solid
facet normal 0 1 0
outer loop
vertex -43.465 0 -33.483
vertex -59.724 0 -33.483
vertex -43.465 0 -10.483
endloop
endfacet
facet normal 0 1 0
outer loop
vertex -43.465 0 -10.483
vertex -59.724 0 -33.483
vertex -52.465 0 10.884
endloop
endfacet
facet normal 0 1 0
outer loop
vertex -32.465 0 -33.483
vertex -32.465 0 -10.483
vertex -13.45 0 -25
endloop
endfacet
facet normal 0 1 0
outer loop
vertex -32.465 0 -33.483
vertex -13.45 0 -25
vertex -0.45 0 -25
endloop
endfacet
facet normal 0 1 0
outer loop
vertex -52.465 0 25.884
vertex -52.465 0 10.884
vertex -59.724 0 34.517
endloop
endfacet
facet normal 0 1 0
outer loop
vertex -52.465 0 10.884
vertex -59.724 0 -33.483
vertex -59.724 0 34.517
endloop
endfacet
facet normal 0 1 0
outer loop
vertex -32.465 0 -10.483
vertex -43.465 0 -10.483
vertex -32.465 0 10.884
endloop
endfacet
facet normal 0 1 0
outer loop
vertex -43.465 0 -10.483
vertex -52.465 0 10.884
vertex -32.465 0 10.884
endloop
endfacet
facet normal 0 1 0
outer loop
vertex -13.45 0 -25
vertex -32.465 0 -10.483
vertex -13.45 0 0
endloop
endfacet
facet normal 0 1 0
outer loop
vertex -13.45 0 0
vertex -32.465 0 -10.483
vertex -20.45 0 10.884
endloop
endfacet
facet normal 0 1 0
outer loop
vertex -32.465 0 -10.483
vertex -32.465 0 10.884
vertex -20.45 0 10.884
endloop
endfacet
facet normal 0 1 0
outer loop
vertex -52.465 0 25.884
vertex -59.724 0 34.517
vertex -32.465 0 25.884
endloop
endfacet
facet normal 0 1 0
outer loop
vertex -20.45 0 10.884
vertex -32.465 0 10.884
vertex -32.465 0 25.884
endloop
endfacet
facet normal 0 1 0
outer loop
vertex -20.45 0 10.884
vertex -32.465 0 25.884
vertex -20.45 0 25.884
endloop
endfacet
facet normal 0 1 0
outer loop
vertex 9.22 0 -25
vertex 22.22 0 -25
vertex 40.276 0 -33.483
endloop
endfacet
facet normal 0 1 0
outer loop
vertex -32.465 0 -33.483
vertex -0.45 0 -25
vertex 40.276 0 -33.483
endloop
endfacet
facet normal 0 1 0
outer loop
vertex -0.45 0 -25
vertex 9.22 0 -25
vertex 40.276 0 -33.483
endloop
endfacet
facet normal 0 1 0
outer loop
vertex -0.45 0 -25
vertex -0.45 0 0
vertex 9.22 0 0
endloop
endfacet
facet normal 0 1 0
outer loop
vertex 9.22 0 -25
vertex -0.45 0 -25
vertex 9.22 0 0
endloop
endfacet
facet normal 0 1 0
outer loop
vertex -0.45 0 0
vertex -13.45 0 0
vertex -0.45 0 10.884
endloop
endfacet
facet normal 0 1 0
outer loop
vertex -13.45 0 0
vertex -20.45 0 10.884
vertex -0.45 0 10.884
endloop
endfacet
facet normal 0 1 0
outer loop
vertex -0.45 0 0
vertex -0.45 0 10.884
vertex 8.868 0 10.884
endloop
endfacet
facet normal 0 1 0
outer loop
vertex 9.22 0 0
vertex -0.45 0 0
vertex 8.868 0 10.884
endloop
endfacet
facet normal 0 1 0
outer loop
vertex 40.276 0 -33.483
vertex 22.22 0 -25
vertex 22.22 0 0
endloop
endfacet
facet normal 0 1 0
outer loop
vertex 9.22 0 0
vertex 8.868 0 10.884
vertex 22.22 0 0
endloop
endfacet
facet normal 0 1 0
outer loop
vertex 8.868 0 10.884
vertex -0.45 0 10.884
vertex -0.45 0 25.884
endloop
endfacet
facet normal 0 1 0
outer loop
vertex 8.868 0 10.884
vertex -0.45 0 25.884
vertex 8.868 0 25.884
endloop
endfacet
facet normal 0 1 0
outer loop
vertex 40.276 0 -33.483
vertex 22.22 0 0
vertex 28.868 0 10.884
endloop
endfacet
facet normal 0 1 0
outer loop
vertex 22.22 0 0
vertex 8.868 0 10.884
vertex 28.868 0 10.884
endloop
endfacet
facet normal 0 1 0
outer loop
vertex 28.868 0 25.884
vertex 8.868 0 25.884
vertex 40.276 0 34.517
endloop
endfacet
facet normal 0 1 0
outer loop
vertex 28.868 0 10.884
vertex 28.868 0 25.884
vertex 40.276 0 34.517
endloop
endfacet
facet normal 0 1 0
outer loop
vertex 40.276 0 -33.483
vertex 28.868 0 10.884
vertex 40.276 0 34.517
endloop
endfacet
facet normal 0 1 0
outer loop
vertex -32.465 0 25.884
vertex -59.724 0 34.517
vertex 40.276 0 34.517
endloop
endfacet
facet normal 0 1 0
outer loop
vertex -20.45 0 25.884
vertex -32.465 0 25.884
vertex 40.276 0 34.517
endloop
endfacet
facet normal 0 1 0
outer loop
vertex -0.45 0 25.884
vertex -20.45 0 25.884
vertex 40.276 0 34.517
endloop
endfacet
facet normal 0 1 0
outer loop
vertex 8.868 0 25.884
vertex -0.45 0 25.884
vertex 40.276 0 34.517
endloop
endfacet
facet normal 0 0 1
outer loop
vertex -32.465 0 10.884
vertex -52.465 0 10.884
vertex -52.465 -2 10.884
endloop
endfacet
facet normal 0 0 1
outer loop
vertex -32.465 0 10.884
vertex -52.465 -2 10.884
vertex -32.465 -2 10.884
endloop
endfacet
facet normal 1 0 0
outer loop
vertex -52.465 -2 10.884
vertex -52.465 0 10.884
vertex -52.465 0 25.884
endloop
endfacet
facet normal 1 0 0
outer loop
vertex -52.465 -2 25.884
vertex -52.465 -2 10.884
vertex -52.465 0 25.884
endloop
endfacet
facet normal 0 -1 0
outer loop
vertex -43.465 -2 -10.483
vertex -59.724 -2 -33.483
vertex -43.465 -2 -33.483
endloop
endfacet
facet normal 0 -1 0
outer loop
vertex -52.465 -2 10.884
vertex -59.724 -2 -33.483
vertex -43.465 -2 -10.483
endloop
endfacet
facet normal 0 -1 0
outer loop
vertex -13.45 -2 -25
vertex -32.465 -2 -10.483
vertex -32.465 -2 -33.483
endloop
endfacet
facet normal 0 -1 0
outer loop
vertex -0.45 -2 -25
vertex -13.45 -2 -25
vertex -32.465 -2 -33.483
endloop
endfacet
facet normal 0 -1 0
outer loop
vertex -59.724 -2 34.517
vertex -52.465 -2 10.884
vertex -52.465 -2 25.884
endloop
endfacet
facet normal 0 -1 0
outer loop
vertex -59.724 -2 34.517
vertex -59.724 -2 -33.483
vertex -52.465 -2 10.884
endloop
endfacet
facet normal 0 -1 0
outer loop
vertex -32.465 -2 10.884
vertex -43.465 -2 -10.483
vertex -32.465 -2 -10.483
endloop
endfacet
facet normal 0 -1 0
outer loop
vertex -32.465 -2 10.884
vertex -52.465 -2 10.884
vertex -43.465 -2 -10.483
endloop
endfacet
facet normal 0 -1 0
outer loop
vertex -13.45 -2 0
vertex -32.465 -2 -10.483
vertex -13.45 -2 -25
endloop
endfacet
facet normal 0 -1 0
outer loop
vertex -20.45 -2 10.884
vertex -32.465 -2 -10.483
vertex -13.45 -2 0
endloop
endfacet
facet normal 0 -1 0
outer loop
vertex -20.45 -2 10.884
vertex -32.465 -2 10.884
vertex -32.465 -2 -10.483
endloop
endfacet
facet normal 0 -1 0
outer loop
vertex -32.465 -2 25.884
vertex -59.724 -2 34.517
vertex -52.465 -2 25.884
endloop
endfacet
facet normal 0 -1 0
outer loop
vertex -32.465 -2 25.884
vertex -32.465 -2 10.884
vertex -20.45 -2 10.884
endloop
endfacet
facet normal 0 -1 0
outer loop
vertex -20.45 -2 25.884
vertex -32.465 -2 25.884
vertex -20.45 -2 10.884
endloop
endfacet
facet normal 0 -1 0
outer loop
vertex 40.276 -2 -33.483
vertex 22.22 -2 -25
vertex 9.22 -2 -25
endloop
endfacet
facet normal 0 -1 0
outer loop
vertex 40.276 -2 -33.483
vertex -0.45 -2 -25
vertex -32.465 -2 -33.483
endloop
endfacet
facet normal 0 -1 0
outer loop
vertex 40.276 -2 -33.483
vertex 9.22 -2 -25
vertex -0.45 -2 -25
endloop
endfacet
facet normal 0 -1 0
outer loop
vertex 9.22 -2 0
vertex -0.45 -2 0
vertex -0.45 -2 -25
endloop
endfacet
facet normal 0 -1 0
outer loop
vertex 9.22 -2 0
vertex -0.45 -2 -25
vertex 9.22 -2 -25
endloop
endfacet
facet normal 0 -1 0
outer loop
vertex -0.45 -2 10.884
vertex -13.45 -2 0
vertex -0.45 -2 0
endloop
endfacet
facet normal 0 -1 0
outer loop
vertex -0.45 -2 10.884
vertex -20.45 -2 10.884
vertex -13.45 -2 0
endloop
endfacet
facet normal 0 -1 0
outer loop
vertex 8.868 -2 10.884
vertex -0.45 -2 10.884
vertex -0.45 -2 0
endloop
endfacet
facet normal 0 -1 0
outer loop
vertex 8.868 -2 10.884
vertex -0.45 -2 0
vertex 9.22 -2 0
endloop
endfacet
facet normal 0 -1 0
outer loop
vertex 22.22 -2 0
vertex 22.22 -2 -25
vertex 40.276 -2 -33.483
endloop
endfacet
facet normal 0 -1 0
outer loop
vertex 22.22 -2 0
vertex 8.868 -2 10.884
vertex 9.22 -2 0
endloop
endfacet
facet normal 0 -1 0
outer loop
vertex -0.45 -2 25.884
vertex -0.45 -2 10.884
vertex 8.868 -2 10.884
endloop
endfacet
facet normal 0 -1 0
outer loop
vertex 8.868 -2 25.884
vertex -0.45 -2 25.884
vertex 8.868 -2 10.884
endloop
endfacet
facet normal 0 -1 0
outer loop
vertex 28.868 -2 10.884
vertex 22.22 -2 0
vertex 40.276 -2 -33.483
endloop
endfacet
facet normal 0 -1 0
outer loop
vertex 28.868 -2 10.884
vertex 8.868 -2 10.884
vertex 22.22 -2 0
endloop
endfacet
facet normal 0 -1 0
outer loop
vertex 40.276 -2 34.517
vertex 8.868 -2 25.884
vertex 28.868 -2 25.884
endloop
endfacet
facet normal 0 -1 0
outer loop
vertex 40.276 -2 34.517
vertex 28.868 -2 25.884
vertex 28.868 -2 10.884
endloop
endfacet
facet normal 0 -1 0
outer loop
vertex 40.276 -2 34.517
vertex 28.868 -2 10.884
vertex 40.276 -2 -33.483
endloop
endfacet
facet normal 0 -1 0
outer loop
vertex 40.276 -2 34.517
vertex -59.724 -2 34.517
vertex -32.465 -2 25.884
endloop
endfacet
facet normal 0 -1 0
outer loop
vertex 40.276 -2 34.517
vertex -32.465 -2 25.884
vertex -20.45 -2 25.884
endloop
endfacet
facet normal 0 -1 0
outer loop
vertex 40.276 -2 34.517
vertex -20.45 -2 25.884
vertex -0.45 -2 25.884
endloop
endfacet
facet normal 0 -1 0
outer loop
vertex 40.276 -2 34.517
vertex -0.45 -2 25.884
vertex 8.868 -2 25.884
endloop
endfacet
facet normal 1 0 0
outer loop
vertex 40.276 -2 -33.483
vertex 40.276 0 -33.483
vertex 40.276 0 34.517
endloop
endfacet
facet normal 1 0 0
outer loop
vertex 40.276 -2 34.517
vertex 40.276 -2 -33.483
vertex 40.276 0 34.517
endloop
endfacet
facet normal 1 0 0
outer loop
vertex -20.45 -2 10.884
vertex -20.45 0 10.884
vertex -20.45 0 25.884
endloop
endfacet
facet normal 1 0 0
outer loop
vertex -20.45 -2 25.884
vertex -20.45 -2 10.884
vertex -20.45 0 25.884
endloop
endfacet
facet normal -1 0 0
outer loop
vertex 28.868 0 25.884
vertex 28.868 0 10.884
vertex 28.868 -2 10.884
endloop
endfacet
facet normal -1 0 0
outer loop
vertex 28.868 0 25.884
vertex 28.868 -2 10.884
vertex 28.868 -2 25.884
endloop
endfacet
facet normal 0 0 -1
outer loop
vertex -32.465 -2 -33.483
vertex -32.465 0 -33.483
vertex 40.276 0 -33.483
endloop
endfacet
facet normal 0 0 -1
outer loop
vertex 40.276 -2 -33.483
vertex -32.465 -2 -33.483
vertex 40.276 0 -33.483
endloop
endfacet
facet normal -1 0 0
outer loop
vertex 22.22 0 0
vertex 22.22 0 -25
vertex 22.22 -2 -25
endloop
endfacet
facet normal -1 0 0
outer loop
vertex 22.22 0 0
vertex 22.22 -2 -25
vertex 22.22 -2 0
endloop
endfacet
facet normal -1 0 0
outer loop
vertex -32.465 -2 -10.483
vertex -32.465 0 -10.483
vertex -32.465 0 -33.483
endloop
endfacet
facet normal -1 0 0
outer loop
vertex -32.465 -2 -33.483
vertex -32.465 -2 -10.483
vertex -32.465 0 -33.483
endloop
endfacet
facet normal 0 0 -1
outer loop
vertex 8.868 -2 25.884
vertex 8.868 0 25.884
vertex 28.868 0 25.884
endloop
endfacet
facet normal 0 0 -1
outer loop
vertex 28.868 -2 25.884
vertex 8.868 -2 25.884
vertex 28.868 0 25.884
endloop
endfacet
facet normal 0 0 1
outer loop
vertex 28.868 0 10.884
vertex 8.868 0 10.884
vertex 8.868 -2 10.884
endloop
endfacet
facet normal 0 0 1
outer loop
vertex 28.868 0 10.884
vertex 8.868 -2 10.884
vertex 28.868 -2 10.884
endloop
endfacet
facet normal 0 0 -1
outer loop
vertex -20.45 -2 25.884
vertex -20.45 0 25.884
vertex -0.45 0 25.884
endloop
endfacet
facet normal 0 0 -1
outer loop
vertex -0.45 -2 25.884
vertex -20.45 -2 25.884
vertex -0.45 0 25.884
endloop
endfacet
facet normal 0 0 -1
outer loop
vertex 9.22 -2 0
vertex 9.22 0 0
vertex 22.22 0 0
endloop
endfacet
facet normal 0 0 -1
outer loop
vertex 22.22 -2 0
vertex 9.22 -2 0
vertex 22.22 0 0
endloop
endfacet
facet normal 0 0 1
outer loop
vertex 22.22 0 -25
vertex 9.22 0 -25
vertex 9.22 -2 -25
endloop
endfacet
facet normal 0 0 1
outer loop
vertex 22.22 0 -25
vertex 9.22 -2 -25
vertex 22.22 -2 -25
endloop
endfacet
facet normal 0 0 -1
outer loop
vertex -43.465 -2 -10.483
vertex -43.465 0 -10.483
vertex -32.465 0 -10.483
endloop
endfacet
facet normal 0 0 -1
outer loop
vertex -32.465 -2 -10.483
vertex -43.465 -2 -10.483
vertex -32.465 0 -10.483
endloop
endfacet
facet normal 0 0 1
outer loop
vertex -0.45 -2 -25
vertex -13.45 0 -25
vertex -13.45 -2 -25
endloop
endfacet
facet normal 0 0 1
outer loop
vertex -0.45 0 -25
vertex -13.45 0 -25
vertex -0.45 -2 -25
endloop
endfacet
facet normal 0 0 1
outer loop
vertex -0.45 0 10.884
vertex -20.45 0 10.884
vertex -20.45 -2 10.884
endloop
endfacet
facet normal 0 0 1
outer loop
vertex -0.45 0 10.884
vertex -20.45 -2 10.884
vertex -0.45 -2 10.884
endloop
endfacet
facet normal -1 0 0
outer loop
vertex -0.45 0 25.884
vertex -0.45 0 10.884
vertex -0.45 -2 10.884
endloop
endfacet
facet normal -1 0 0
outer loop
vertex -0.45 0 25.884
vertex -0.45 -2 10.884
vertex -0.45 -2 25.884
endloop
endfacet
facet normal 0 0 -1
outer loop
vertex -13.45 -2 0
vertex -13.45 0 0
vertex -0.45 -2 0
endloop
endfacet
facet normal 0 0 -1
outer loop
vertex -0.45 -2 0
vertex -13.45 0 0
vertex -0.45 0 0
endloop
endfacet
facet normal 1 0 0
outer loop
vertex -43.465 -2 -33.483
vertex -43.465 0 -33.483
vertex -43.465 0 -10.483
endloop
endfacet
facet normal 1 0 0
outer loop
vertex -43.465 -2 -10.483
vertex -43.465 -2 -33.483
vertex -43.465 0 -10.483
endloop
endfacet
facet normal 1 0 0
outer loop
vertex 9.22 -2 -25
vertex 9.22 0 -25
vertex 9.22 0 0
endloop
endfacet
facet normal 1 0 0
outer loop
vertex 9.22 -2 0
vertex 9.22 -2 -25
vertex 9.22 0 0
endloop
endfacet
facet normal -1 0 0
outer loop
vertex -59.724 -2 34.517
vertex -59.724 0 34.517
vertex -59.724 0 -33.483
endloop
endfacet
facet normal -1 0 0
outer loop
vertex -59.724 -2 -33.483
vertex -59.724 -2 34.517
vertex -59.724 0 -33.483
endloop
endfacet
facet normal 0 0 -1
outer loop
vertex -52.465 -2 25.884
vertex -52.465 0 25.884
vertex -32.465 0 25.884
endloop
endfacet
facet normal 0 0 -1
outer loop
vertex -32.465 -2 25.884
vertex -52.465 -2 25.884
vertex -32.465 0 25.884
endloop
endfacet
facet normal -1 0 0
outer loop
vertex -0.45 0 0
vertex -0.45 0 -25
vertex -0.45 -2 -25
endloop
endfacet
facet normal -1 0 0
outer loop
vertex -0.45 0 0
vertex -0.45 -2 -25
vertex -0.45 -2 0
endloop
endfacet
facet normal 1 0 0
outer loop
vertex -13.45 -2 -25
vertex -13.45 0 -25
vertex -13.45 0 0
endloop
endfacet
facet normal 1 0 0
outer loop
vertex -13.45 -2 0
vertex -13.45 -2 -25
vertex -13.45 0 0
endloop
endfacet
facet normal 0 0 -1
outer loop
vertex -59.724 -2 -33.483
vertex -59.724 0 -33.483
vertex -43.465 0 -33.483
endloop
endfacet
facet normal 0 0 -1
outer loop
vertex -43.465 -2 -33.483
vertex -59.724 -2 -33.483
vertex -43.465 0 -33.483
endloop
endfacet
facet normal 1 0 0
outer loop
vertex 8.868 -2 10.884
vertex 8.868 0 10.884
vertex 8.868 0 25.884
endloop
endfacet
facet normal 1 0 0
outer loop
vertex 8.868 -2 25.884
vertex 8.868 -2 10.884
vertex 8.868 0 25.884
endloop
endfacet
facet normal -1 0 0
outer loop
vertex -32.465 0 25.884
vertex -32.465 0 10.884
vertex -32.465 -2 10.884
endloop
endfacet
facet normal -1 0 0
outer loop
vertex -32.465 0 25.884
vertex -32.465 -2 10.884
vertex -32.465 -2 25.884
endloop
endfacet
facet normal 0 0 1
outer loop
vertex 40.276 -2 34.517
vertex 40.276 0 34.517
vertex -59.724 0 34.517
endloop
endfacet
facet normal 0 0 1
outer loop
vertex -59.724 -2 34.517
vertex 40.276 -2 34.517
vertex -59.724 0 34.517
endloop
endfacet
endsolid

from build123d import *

# Parameters (mm, degrees)
F0_W     = 13
F0_H     = 25
F0_W_2   = 20
F0_H_2   = 15
F1_DEPTH = 2


with BuildPart() as f1:
    # F0 (on Front) → F1 (new body)
    with BuildSketch(Plane.XZ):
        Polygon((40.276188, 34.517385), (-59.723812, 34.517385), (-59.723812, -33.482615), (-43.465011, -33.482615), (-43.465011, -10.482615), (-32.465011, -10.482615), (-32.465011, -33.482615), (40.276188, -33.482615), align=None)
        with Locations((-6.950044, -12.5)):
            Rectangle(F0_W, F0_H, mode=Mode.SUBTRACT)
        with Locations((15.719853, -12.5)):
            Rectangle(F0_W, F0_H, mode=Mode.SUBTRACT)
        with Locations((-42.465011, 18.383584)):
            Rectangle(F0_W_2, F0_H_2, mode=Mode.SUBTRACT)
        with Locations((-10.450044, 18.383584)):
            Rectangle(F0_W_2, F0_H_2, mode=Mode.SUBTRACT)
        with Locations((18.867977, 18.383584)):
            Rectangle(F0_W_2, F0_H_2, mode=Mode.SUBTRACT)
    extrude(amount=F1_DEPTH)


solid = f1.part
